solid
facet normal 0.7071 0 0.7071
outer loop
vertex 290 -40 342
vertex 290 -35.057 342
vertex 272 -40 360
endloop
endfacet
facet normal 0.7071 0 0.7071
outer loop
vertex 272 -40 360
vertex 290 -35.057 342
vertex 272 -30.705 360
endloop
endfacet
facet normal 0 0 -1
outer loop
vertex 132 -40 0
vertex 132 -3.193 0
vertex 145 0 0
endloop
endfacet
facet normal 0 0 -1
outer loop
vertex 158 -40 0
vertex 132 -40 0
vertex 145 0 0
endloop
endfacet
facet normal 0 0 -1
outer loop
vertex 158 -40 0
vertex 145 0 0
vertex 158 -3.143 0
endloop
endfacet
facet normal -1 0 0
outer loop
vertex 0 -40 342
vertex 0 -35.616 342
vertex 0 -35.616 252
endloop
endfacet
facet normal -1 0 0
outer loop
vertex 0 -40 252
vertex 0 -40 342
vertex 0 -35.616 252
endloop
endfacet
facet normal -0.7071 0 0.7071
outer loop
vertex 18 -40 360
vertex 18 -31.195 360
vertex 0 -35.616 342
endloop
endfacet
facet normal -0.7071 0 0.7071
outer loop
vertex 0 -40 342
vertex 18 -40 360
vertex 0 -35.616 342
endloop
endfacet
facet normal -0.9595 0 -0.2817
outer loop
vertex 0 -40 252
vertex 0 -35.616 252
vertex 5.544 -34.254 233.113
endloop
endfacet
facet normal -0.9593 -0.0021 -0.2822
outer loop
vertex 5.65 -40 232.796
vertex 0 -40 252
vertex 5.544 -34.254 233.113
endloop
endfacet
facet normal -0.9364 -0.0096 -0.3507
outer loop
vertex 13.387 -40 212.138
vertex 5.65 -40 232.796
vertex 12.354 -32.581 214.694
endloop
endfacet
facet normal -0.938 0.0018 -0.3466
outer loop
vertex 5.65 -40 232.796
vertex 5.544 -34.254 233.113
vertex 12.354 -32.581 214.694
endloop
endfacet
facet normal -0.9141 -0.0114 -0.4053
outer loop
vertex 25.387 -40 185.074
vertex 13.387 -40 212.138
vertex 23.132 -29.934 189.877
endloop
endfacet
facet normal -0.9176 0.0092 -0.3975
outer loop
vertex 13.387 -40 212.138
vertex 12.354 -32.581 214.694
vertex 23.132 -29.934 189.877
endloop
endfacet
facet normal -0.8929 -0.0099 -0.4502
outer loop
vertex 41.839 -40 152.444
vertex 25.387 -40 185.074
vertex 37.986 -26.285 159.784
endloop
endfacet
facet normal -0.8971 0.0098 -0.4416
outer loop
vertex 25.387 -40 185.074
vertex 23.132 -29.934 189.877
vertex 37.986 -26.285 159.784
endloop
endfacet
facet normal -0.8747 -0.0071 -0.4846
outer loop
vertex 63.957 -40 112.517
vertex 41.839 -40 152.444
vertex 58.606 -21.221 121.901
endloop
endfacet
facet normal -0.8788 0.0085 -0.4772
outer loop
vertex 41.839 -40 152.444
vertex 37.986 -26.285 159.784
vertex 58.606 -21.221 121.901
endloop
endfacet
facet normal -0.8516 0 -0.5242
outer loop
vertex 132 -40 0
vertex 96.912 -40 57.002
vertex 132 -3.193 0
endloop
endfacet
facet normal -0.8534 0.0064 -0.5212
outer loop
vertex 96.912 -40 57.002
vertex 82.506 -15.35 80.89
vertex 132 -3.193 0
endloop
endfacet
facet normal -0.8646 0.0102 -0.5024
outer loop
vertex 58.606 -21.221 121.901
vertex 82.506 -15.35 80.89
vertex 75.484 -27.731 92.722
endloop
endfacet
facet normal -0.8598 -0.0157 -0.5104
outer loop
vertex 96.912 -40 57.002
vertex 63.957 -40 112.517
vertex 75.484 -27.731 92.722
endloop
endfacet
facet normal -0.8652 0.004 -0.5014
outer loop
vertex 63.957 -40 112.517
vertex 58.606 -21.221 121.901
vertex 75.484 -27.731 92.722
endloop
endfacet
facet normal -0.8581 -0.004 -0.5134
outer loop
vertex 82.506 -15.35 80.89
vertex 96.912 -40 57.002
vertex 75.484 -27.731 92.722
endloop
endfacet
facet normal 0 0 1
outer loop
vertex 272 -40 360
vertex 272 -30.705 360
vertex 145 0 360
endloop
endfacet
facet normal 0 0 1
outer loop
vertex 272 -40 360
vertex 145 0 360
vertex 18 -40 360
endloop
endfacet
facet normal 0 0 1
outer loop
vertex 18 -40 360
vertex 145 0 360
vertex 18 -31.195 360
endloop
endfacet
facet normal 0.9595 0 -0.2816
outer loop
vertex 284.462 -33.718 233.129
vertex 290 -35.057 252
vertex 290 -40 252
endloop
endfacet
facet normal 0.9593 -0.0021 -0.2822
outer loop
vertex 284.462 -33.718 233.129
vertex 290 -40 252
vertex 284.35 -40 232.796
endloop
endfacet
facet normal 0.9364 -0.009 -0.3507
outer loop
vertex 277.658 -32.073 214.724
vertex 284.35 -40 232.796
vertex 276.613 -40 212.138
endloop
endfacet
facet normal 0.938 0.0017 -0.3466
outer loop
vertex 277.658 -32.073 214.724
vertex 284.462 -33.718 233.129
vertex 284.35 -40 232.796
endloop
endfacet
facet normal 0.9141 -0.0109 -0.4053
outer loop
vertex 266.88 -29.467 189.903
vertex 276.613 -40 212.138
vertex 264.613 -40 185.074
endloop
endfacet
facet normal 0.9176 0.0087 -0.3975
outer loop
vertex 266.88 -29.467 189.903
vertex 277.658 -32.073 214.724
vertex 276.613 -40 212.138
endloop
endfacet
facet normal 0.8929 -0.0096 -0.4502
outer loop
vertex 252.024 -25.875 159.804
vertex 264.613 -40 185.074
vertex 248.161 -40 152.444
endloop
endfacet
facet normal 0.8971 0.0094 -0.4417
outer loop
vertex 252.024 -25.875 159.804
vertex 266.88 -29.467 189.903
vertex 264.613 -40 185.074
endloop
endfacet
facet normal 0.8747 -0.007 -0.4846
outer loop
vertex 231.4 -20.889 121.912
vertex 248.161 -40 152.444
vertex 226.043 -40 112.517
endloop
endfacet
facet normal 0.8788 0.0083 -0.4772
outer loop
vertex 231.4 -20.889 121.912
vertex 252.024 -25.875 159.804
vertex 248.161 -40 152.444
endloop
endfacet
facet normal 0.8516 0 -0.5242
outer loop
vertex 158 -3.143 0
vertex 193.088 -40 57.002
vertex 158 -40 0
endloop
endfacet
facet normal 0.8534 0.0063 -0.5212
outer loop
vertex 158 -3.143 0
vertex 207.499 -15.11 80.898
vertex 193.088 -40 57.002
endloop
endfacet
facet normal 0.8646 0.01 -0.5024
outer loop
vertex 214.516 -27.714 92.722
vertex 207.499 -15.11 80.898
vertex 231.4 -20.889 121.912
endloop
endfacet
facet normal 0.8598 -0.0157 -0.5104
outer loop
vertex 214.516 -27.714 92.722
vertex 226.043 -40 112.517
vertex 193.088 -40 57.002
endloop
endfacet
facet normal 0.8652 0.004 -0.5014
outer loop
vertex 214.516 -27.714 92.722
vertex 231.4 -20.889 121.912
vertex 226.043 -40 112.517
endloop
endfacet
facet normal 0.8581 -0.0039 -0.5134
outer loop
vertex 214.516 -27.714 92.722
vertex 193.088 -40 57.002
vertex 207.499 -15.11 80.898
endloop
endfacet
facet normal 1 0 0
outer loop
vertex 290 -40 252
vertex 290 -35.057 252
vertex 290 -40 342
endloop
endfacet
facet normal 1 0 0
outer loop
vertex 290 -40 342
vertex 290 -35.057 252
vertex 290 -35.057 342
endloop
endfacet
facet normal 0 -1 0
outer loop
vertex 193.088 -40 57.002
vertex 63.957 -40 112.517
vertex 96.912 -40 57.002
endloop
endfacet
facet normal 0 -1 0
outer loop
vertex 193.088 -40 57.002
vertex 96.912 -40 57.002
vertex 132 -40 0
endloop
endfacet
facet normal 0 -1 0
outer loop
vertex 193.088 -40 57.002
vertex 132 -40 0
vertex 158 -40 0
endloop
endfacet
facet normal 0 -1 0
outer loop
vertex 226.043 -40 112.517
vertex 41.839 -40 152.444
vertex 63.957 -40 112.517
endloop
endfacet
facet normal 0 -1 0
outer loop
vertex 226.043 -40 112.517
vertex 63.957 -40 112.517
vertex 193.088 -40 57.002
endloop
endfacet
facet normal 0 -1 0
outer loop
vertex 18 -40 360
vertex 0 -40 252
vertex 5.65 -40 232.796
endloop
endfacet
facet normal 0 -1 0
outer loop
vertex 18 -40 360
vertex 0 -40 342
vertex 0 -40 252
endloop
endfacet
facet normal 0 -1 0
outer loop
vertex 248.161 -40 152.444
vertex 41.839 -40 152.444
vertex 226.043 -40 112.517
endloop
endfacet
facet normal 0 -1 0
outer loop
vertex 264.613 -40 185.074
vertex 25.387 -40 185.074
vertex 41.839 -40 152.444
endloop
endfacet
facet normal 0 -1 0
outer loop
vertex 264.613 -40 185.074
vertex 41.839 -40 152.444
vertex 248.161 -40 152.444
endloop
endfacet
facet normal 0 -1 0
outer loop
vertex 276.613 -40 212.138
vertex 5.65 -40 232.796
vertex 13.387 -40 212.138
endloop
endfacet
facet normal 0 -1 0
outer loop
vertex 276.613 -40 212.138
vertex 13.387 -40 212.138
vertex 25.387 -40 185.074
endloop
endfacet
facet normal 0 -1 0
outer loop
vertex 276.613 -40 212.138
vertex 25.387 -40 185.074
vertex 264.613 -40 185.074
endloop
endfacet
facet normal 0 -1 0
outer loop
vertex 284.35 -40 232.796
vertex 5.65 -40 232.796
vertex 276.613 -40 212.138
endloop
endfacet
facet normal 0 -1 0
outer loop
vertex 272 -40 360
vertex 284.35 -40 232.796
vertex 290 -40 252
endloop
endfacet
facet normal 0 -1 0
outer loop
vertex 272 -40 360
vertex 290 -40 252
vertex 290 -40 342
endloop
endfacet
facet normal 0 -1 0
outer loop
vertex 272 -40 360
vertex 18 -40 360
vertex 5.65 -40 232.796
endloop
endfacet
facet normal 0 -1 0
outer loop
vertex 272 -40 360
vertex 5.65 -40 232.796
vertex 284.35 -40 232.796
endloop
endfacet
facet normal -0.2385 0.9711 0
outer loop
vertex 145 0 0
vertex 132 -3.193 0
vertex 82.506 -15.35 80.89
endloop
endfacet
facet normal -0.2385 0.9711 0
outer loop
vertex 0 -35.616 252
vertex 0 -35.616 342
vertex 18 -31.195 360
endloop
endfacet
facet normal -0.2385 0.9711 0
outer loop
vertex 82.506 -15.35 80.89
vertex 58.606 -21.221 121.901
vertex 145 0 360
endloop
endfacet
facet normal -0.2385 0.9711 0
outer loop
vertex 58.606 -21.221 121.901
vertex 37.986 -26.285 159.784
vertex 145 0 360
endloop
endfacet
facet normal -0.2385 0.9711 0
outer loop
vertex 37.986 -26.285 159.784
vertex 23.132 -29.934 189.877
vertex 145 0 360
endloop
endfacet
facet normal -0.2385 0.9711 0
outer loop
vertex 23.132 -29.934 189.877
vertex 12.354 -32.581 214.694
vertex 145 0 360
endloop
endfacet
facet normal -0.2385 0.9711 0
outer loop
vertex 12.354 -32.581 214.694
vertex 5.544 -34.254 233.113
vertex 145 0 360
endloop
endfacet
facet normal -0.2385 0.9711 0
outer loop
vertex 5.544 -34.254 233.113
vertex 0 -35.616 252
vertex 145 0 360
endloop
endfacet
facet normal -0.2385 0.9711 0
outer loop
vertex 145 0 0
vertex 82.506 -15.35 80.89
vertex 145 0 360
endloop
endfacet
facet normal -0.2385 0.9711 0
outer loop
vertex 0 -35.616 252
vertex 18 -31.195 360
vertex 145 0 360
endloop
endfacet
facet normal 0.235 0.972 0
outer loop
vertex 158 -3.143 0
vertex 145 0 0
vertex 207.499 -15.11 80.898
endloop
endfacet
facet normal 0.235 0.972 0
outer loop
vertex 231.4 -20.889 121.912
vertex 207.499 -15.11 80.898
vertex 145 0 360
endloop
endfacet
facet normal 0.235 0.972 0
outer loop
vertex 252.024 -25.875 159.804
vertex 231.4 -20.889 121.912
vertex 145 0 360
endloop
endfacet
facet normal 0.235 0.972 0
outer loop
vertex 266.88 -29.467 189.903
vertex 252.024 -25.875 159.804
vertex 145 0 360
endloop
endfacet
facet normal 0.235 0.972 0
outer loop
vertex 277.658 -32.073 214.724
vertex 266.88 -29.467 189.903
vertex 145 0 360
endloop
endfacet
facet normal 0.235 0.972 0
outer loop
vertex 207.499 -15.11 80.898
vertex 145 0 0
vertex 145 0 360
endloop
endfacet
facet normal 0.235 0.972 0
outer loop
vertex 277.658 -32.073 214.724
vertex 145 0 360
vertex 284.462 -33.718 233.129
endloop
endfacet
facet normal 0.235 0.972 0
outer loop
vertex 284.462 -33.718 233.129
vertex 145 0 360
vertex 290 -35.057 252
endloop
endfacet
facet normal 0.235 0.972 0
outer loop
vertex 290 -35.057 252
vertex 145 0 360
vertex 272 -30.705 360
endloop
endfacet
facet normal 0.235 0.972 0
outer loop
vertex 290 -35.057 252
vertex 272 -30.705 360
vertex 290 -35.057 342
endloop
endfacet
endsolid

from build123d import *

# Parameters (mm, degrees)
F1_DEPTH = 40
F3_DEPTH = 494


with BuildPart() as f1:
    # F0 (on Front) → F1 (new body)
    with BuildSketch(Plane.XZ):
        with BuildLine():
            add(Edge.make_bspline(
                [(0, 252), (15.8393937026, 187.6250477101), (73.9196968513, 93.8125238551), (132, 0)],
                knots=[0.3599862205, 0.3599862205, 0.3599862205, 0.3599862205, 1, 1, 1, 1], degree=3))
            Line((132, 0), (158, 0))
            add(Edge.make_bspline(
                [(290, 252), (274.1606062974, 187.6250477101), (216.0803031487, 93.8125238551), (158, 0)],
                knots=[0.3599862205, 0.3599862205, 0.3599862205, 0.3599862205, 1, 1, 1, 1], degree=3))
            Line((290, 252), (290, 342))
            Line((290, 342), (272, 360))
            Line((272, 360), (18, 360))
            Line((18, 360), (0, 342))
            Line((0, 342), (0, 252))
        make_face()
    extrude(amount=F1_DEPTH)

    # F2 (on face) → F3 (cut)
    with BuildSketch(Plane.XY.offset(360)):
        Polygon((-17.8489275277, 46.4588217437), (-17.8489275277, -40), (145, 0), (310.4465901852, -40), (307.7366054058, 46.4588217437), align=None)
    extrude(amount=-F3_DEPTH, mode=Mode.SUBTRACT)


solid = f1.part
